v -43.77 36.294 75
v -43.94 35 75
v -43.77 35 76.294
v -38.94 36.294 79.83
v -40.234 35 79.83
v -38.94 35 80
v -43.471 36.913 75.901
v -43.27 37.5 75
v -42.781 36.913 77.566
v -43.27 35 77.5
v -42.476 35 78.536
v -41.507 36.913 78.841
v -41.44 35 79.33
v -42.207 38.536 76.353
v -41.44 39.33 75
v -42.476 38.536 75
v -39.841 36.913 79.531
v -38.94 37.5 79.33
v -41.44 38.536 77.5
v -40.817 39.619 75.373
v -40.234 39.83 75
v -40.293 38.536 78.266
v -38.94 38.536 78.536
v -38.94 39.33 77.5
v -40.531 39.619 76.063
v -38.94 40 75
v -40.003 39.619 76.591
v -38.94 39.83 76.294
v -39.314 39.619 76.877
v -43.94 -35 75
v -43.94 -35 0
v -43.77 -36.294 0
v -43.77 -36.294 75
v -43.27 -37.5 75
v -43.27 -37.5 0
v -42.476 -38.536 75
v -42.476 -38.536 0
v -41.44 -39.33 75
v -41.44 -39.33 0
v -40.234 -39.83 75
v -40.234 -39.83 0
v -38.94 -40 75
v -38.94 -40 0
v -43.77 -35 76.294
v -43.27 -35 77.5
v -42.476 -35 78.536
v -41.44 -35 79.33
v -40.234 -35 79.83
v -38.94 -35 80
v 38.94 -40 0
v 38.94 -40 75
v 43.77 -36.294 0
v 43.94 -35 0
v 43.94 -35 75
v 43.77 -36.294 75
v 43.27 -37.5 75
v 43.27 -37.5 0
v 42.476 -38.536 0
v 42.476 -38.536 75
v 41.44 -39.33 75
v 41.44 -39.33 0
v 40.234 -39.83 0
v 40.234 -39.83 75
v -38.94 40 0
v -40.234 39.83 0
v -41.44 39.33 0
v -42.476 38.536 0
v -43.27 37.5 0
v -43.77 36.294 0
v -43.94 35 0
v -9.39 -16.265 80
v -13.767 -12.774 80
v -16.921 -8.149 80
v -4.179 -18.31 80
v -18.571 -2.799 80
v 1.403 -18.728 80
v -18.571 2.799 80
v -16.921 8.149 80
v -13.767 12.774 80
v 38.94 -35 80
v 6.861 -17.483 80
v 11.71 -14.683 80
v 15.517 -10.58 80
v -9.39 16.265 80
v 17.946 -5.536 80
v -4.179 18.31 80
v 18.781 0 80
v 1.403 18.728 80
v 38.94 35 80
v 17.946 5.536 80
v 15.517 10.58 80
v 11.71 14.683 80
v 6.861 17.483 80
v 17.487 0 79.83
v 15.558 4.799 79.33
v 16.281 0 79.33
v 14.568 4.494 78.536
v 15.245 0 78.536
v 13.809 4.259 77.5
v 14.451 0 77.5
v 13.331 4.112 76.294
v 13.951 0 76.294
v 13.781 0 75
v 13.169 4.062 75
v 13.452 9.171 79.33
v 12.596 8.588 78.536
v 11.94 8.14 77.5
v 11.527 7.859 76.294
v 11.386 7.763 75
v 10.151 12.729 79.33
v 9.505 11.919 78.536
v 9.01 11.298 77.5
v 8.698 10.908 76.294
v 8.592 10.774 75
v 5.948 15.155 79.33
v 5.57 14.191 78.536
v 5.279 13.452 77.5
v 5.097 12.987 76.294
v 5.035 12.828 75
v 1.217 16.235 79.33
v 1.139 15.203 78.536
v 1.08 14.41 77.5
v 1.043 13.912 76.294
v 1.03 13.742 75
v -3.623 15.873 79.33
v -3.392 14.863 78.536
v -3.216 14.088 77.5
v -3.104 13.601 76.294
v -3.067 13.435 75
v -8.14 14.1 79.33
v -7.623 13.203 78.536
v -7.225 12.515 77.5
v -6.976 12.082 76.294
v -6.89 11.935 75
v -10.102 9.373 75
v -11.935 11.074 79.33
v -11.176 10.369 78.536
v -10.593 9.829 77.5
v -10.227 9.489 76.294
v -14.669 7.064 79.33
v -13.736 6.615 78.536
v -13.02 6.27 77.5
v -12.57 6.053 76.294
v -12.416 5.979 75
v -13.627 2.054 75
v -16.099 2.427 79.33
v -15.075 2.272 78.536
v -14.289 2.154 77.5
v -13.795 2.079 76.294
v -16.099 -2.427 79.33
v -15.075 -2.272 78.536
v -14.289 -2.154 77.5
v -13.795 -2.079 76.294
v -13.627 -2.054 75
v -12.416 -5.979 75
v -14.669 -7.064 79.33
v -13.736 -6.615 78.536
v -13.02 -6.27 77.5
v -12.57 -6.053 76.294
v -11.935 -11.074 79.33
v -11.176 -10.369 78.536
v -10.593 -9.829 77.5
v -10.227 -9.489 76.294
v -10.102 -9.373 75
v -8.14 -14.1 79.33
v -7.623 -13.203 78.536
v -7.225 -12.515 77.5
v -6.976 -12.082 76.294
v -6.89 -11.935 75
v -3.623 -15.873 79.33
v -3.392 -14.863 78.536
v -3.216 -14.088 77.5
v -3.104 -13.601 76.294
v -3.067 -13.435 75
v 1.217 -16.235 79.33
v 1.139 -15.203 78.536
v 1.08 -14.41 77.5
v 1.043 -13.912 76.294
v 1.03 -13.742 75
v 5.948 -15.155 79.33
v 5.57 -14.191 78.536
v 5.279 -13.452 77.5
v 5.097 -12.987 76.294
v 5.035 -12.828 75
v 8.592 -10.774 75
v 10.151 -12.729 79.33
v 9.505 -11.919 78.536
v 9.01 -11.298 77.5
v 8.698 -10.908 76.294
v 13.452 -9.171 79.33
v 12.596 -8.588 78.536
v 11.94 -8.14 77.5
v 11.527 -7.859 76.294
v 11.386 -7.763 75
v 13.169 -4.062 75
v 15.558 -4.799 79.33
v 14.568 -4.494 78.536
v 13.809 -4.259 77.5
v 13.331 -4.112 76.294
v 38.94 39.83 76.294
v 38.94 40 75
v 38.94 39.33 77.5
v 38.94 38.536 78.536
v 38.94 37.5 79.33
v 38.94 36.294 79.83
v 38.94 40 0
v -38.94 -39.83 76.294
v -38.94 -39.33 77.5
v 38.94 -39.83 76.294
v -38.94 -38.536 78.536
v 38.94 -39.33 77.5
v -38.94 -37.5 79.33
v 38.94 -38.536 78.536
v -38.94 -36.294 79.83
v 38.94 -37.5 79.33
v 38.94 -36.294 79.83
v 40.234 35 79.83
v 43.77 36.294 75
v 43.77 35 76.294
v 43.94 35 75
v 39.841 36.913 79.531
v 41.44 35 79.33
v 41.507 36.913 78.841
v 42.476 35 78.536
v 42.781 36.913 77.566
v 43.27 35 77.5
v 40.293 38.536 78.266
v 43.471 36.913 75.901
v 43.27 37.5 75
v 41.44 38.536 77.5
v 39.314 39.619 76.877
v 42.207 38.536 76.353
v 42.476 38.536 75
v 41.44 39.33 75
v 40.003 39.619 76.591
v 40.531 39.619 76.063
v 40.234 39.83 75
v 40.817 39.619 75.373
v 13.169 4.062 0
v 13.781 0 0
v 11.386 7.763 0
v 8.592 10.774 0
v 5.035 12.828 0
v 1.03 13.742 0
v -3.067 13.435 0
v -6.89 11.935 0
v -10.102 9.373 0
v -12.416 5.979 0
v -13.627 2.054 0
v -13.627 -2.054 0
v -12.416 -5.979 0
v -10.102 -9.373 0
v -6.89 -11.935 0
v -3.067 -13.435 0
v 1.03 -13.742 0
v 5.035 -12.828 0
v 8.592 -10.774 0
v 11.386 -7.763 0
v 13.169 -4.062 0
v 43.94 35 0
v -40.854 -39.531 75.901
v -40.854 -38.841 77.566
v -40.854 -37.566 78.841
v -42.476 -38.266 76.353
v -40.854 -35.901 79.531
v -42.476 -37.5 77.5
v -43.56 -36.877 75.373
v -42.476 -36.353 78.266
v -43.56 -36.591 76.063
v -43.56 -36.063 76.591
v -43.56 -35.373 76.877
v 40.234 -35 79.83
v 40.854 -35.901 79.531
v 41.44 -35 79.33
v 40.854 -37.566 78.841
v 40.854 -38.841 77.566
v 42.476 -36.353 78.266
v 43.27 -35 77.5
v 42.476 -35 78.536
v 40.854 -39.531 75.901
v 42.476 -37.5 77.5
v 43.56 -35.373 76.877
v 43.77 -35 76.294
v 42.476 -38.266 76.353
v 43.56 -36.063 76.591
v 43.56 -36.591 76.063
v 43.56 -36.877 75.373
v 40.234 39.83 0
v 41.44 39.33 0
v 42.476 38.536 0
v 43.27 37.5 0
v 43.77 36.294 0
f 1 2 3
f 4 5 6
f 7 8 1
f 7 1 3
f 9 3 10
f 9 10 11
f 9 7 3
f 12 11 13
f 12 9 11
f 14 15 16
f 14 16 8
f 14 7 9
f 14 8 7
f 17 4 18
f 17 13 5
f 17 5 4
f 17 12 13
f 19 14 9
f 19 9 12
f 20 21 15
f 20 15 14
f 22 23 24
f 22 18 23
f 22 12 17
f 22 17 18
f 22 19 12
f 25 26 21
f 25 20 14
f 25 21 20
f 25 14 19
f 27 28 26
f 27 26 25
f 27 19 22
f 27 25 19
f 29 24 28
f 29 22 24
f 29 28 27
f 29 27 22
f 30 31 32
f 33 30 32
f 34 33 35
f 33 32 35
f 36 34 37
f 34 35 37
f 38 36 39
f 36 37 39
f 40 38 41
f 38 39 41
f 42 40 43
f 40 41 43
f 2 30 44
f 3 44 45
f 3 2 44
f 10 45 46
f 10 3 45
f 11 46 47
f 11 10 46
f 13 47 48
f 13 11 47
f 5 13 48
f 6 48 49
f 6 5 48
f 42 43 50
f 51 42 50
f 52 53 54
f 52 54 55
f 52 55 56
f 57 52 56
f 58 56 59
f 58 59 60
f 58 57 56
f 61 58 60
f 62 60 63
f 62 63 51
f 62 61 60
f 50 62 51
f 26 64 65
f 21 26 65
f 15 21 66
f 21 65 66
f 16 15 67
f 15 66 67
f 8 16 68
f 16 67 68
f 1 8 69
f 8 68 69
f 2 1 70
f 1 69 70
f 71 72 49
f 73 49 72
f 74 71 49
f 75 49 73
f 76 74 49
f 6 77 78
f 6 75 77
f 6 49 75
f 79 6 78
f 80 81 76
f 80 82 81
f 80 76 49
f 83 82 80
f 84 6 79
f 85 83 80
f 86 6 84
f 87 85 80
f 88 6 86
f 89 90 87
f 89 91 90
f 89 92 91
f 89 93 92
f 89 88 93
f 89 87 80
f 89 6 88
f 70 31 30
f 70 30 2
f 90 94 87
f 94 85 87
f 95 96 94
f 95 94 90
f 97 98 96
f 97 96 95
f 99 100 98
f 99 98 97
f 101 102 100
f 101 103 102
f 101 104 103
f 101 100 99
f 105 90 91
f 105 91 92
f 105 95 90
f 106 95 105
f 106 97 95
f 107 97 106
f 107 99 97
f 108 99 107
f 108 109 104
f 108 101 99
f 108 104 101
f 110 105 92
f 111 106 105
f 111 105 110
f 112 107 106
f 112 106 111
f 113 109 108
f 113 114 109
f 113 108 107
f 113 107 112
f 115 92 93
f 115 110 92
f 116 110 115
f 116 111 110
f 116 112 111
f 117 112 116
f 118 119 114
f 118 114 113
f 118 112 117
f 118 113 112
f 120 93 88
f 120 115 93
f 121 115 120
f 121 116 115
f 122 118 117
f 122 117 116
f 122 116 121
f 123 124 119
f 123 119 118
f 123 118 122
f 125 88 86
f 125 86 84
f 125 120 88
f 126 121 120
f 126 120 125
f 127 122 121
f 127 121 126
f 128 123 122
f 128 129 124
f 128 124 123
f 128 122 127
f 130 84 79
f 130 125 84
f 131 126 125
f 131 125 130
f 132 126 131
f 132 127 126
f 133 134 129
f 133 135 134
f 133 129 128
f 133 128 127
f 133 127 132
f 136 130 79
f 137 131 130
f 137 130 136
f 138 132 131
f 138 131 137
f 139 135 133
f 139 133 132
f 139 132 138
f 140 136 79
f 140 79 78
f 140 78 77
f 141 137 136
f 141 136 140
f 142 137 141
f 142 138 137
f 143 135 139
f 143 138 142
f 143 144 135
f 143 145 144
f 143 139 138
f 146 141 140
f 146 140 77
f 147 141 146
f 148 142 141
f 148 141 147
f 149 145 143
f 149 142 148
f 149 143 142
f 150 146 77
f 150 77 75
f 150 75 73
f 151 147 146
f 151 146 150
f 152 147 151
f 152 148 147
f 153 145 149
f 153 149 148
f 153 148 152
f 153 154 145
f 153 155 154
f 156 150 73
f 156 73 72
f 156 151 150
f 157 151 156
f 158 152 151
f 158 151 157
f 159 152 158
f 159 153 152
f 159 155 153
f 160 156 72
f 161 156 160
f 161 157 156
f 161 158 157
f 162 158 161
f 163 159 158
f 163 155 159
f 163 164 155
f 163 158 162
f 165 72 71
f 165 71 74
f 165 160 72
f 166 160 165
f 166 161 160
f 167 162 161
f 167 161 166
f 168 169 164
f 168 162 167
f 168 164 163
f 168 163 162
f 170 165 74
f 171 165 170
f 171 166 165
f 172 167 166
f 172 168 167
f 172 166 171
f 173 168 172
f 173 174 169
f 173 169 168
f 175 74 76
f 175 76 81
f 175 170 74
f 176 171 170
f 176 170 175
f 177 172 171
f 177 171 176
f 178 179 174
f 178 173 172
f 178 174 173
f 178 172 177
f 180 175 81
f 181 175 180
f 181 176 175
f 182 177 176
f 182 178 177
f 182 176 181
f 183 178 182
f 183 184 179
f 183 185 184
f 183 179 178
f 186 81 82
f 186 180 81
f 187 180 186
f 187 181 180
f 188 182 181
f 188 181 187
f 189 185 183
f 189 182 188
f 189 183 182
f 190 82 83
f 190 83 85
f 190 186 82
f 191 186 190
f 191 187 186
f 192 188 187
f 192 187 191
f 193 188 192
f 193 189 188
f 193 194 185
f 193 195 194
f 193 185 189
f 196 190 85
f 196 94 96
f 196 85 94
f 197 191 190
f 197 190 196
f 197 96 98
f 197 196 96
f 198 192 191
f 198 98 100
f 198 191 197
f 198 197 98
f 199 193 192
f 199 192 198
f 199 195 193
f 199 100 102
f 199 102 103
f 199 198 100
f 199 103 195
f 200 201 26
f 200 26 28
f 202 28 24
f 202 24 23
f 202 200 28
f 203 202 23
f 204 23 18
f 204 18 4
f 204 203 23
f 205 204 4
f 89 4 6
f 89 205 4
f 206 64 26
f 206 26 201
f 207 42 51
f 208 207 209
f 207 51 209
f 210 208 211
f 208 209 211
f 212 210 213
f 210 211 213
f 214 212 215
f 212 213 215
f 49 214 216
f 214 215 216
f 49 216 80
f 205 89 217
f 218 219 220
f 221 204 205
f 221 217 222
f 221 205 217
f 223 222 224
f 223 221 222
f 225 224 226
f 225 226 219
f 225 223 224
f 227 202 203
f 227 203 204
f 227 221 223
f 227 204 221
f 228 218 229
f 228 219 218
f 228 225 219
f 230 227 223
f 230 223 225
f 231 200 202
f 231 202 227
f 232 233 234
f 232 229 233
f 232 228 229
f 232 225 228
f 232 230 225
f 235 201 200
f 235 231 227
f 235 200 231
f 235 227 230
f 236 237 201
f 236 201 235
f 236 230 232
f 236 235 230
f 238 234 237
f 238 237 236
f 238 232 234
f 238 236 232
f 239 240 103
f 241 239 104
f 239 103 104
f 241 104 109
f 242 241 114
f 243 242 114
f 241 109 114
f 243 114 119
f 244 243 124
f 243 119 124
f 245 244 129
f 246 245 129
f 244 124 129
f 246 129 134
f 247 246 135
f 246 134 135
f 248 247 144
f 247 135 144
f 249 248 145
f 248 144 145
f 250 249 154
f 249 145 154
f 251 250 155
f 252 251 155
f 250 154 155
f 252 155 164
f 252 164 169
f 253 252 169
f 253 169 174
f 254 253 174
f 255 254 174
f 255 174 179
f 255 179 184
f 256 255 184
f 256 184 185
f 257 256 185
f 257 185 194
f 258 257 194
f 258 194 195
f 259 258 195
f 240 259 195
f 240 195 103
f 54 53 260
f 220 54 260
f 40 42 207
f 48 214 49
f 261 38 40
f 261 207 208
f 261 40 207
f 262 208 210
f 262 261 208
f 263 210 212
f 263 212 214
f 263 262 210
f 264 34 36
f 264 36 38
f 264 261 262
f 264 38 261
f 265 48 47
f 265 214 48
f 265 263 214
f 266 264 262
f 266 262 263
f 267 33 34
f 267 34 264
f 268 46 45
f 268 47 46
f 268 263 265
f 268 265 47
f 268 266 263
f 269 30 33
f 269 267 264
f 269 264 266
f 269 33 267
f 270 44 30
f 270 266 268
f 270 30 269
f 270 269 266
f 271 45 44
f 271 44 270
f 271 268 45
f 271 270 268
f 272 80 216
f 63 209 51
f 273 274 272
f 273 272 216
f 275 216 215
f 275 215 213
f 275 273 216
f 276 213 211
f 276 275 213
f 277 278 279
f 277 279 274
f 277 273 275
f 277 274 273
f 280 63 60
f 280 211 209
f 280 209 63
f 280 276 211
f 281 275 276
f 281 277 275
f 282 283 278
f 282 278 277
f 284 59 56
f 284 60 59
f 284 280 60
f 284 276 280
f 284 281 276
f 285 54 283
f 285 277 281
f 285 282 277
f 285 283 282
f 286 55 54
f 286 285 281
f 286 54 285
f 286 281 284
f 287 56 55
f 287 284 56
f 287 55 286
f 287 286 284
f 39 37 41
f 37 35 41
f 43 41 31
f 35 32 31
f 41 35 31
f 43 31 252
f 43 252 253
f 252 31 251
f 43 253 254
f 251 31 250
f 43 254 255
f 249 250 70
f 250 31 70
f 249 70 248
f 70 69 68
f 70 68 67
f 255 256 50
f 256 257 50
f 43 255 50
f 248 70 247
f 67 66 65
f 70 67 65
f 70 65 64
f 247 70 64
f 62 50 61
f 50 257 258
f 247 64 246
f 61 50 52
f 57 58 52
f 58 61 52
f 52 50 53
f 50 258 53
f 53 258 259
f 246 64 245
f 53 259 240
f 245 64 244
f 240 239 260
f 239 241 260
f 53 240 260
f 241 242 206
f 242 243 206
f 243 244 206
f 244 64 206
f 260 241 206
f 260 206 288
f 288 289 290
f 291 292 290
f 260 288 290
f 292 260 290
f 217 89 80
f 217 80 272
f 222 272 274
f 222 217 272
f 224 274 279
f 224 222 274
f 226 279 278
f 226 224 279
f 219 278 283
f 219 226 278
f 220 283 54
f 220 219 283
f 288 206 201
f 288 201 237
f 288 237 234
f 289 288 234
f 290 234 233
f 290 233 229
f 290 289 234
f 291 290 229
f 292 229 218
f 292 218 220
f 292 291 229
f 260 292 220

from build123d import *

# Parameters (mm, degrees)
F0_W          = 87.8805932263
F0_H          = 80
F1_DEPTH      = 80
F2_R          = 13.7808794965
F3_DEPTH      = 25
F4_R          = 13.7808794965
F7_DEPTH      = 25
F5_R          = 13.7808794965
F8_DEPTH      = 25
F6_R          = 13.7808794965
F9_DEPTH      = 105.001
F10_R         = 5
F11_T1_DEPTH  = 87.5
F11_S5_W      = 5
F11_S5_H      = 5
F11_T6_DEPTH  = 5
F11_S11_W     = 5
F11_S11_H     = 5
F11_T12_DEPTH = 5
F11_S17_W     = 5
F11_S17_H     = 5
F11_T18_DEPTH = 5
F11_S23_W     = 5
F11_S23_H     = 5
F11_T24_DEPTH = 5


# Not quite as in the source:
# - a fillet or chamfer that OpenCascade refuses, or shapes differently, is made with other operations: its cross-section is extruded or revolved along the edge and cut away or added


with BuildPart() as f1:
    # F0 (on Top) → F1 (new body)
    with BuildSketch(Plane.XY):
        Rectangle(F0_W, F0_H)
    extrude(amount=F1_DEPTH)

    # F2 (on face) → F3 (join)
    with BuildSketch(Plane.XY.offset(80)):
        Circle(F2_R)
    extrude(amount=F3_DEPTH)

    # F4 (on face) → F7 (cut)
    with BuildSketch(Plane.XY.offset(105)):
        Circle(F4_R)
    extrude(amount=-F7_DEPTH, mode=Mode.SUBTRACT)

    # F5 (on face) → F8 (cut)
    with BuildSketch(Plane.XY):
        Circle(F5_R)
    extrude(amount=-F8_DEPTH, mode=Mode.SUBTRACT)

    # F6 (on face) → F9 (cut, through all)
    with BuildSketch(Plane.XY.offset(105)):
        Circle(F6_R)
    extrude(amount=-F9_DEPTH, mode=Mode.SUBTRACT)

    # F10
    f10_edges = [f1.edges().sort_by_distance(p)[0] for p in [
        (0, 40, 80),
        (43.940297, 0, 80),
        (-43.940297, 0, 80),
        (0, -40, 80),
        (-13.780879, 0, 80),
    ]]
    fillet(f10_edges, radius=F10_R)

    # F11: fillet of radius 5 on 15 edges, made by hand

    # F11_s2 → F11_t1 (cut)
    with BuildSketch(Plane.XY.offset(-12.5)):
        with BuildLine():
            ThreePointArc((-43.9402966131, -35), (-42.4758305191, -38.5355339059), (-38.9402966131, -40))
            Line((-38.9402966131, -40), (-43.9402966131, -40))
            Line((-43.9402966131, -40), (-43.9402966131, -35))
        make_face()
        with BuildLine():
            ThreePointArc((43.9402966131, -35), (42.4758305191, -38.5355339059), (38.9402966131, -40))
            Line((38.9402966131, -40), (43.9402966131, -40))
            Line((43.9402966131, -40), (43.9402966131, -35))
        make_face()
        with BuildLine():
            ThreePointArc((-38.9402966131, 40), (-42.4758305191, 38.5355339059), (-43.9402966131, 35))
            Line((-43.9402966131, 35), (-43.9402966131, 40))
            Line((-43.9402966131, 40), (-38.9402966131, 40))
        make_face()
        with BuildLine():
            ThreePointArc((38.9402966131, 40), (42.4758305191, 38.5355339059), (43.9402966131, 35))
            Line((43.9402966131, 35), (43.9402966131, 40))
            Line((43.9402966131, 40), (38.9402966131, 40))
        make_face()
    extrude(amount=F11_T1_DEPTH, mode=Mode.SUBTRACT)


with BuildPart() as f11_tool4:
    # F11_s5 → F11_t6 (new body)
    with BuildSketch(Plane.XZ.offset(-35)):
        with Locations((41.4402966131, 77.5)):
            Rectangle(F11_S5_W, F11_S5_H)
    extrude(amount=-F11_T6_DEPTH)

    # F11_s7 → F11_t8 (revolve, cut)
    with BuildSketch(Plane(origin=(38.9402966131, 35, 75), x_dir=(-0.7071067812, 0, -0.7071067812), z_dir=(0.7071067812, 0, -0.7071067812))):
        with BuildLine():
            ThreePointArc((0, -5), (5, 0), (0, 5))
            Line((0, 5), (0, -5))
        make_face()
    revolve(axis=Axis((38.9402966131, 35, 75), (0, 1, 0)), mode=Mode.SUBTRACT)


with BuildPart() as f1_1:
    add(f1.part)

    # F11_t3: cut F11_tool4
    add(f11_tool4.part, mode=Mode.SUBTRACT)


with BuildPart() as f11_tool10:
    # F11_s11 → F11_t12 (new body)
    with BuildSketch(Plane.XZ.offset(-35)):
        with Locations((-41.4402966131, 77.5)):
            Rectangle(F11_S11_W, F11_S11_H)
    extrude(amount=-F11_T12_DEPTH)

    # F11_s13 → F11_t14 (revolve, cut)
    with BuildSketch(Plane(origin=(-38.9402966131, 35, 75), x_dir=(0.7071067812, 0, -0.7071067812), z_dir=(0.7071067812, 0, 0.7071067812))):
        with BuildLine():
            ThreePointArc((0, -5), (5, 0), (0, 5))
            Line((0, 5), (0, -5))
        make_face()
    revolve(axis=Axis((-38.9402966131, 35, 75), (0, 1, 0)), mode=Mode.SUBTRACT)


with BuildPart() as f1_2:
    add(f1_1.part)

    # F11_t9: cut F11_tool10
    add(f11_tool10.part, mode=Mode.SUBTRACT)


with BuildPart() as f11_tool16:
    # F11_s17 → F11_t18 (new body)
    with BuildSketch(Plane.YZ.offset(38.9402966131)):
        with Locations((-37.5, 77.5)):
            Rectangle(F11_S17_W, F11_S17_H)
    extrude(amount=F11_T18_DEPTH)

    # F11_s19 → F11_t20 (revolve, cut)
    with BuildSketch(Plane(origin=(38.9402966131, -35, 75), x_dir=(0, 0.7071067812, -0.7071067812), z_dir=(0, -0.7071067812, -0.7071067812))):
        with BuildLine():
            ThreePointArc((0, -5), (5, 0), (0, 5))
            Line((0, 5), (0, -5))
        make_face()
    revolve(axis=Axis((38.9402966131, -35, 75), (1, 0, 0)), mode=Mode.SUBTRACT)


with BuildPart() as f1_3:
    add(f1_2.part)

    # F11_t15: cut F11_tool16
    add(f11_tool16.part, mode=Mode.SUBTRACT)


with BuildPart() as f11_tool22:
    # F11_s23 → F11_t24 (new body)
    with BuildSketch(Plane.YZ.offset(-38.9402966131)):
        with Locations((-37.5, 77.5)):
            Rectangle(F11_S23_W, F11_S23_H)
    extrude(amount=-F11_T24_DEPTH)

    # F11_s25 → F11_t26 (revolve, cut)
    with BuildSketch(Plane(origin=(-38.9402966131, -35, 75), x_dir=(0, 0.7071067812, -0.7071067812), z_dir=(0, 0.7071067812, 0.7071067812))):
        with BuildLine():
            ThreePointArc((0, -5), (5, 0), (0, 5))
            Line((0, 5), (0, -5))
        make_face()
    revolve(axis=Axis((-38.9402966131, -35, 75), (-1, 0, 0)), mode=Mode.SUBTRACT)


with BuildPart() as f1_4:
    add(f1_3.part)

    # F11_t21: cut F11_tool22
    add(f11_tool22.part, mode=Mode.SUBTRACT)


solid = f1_4.part
